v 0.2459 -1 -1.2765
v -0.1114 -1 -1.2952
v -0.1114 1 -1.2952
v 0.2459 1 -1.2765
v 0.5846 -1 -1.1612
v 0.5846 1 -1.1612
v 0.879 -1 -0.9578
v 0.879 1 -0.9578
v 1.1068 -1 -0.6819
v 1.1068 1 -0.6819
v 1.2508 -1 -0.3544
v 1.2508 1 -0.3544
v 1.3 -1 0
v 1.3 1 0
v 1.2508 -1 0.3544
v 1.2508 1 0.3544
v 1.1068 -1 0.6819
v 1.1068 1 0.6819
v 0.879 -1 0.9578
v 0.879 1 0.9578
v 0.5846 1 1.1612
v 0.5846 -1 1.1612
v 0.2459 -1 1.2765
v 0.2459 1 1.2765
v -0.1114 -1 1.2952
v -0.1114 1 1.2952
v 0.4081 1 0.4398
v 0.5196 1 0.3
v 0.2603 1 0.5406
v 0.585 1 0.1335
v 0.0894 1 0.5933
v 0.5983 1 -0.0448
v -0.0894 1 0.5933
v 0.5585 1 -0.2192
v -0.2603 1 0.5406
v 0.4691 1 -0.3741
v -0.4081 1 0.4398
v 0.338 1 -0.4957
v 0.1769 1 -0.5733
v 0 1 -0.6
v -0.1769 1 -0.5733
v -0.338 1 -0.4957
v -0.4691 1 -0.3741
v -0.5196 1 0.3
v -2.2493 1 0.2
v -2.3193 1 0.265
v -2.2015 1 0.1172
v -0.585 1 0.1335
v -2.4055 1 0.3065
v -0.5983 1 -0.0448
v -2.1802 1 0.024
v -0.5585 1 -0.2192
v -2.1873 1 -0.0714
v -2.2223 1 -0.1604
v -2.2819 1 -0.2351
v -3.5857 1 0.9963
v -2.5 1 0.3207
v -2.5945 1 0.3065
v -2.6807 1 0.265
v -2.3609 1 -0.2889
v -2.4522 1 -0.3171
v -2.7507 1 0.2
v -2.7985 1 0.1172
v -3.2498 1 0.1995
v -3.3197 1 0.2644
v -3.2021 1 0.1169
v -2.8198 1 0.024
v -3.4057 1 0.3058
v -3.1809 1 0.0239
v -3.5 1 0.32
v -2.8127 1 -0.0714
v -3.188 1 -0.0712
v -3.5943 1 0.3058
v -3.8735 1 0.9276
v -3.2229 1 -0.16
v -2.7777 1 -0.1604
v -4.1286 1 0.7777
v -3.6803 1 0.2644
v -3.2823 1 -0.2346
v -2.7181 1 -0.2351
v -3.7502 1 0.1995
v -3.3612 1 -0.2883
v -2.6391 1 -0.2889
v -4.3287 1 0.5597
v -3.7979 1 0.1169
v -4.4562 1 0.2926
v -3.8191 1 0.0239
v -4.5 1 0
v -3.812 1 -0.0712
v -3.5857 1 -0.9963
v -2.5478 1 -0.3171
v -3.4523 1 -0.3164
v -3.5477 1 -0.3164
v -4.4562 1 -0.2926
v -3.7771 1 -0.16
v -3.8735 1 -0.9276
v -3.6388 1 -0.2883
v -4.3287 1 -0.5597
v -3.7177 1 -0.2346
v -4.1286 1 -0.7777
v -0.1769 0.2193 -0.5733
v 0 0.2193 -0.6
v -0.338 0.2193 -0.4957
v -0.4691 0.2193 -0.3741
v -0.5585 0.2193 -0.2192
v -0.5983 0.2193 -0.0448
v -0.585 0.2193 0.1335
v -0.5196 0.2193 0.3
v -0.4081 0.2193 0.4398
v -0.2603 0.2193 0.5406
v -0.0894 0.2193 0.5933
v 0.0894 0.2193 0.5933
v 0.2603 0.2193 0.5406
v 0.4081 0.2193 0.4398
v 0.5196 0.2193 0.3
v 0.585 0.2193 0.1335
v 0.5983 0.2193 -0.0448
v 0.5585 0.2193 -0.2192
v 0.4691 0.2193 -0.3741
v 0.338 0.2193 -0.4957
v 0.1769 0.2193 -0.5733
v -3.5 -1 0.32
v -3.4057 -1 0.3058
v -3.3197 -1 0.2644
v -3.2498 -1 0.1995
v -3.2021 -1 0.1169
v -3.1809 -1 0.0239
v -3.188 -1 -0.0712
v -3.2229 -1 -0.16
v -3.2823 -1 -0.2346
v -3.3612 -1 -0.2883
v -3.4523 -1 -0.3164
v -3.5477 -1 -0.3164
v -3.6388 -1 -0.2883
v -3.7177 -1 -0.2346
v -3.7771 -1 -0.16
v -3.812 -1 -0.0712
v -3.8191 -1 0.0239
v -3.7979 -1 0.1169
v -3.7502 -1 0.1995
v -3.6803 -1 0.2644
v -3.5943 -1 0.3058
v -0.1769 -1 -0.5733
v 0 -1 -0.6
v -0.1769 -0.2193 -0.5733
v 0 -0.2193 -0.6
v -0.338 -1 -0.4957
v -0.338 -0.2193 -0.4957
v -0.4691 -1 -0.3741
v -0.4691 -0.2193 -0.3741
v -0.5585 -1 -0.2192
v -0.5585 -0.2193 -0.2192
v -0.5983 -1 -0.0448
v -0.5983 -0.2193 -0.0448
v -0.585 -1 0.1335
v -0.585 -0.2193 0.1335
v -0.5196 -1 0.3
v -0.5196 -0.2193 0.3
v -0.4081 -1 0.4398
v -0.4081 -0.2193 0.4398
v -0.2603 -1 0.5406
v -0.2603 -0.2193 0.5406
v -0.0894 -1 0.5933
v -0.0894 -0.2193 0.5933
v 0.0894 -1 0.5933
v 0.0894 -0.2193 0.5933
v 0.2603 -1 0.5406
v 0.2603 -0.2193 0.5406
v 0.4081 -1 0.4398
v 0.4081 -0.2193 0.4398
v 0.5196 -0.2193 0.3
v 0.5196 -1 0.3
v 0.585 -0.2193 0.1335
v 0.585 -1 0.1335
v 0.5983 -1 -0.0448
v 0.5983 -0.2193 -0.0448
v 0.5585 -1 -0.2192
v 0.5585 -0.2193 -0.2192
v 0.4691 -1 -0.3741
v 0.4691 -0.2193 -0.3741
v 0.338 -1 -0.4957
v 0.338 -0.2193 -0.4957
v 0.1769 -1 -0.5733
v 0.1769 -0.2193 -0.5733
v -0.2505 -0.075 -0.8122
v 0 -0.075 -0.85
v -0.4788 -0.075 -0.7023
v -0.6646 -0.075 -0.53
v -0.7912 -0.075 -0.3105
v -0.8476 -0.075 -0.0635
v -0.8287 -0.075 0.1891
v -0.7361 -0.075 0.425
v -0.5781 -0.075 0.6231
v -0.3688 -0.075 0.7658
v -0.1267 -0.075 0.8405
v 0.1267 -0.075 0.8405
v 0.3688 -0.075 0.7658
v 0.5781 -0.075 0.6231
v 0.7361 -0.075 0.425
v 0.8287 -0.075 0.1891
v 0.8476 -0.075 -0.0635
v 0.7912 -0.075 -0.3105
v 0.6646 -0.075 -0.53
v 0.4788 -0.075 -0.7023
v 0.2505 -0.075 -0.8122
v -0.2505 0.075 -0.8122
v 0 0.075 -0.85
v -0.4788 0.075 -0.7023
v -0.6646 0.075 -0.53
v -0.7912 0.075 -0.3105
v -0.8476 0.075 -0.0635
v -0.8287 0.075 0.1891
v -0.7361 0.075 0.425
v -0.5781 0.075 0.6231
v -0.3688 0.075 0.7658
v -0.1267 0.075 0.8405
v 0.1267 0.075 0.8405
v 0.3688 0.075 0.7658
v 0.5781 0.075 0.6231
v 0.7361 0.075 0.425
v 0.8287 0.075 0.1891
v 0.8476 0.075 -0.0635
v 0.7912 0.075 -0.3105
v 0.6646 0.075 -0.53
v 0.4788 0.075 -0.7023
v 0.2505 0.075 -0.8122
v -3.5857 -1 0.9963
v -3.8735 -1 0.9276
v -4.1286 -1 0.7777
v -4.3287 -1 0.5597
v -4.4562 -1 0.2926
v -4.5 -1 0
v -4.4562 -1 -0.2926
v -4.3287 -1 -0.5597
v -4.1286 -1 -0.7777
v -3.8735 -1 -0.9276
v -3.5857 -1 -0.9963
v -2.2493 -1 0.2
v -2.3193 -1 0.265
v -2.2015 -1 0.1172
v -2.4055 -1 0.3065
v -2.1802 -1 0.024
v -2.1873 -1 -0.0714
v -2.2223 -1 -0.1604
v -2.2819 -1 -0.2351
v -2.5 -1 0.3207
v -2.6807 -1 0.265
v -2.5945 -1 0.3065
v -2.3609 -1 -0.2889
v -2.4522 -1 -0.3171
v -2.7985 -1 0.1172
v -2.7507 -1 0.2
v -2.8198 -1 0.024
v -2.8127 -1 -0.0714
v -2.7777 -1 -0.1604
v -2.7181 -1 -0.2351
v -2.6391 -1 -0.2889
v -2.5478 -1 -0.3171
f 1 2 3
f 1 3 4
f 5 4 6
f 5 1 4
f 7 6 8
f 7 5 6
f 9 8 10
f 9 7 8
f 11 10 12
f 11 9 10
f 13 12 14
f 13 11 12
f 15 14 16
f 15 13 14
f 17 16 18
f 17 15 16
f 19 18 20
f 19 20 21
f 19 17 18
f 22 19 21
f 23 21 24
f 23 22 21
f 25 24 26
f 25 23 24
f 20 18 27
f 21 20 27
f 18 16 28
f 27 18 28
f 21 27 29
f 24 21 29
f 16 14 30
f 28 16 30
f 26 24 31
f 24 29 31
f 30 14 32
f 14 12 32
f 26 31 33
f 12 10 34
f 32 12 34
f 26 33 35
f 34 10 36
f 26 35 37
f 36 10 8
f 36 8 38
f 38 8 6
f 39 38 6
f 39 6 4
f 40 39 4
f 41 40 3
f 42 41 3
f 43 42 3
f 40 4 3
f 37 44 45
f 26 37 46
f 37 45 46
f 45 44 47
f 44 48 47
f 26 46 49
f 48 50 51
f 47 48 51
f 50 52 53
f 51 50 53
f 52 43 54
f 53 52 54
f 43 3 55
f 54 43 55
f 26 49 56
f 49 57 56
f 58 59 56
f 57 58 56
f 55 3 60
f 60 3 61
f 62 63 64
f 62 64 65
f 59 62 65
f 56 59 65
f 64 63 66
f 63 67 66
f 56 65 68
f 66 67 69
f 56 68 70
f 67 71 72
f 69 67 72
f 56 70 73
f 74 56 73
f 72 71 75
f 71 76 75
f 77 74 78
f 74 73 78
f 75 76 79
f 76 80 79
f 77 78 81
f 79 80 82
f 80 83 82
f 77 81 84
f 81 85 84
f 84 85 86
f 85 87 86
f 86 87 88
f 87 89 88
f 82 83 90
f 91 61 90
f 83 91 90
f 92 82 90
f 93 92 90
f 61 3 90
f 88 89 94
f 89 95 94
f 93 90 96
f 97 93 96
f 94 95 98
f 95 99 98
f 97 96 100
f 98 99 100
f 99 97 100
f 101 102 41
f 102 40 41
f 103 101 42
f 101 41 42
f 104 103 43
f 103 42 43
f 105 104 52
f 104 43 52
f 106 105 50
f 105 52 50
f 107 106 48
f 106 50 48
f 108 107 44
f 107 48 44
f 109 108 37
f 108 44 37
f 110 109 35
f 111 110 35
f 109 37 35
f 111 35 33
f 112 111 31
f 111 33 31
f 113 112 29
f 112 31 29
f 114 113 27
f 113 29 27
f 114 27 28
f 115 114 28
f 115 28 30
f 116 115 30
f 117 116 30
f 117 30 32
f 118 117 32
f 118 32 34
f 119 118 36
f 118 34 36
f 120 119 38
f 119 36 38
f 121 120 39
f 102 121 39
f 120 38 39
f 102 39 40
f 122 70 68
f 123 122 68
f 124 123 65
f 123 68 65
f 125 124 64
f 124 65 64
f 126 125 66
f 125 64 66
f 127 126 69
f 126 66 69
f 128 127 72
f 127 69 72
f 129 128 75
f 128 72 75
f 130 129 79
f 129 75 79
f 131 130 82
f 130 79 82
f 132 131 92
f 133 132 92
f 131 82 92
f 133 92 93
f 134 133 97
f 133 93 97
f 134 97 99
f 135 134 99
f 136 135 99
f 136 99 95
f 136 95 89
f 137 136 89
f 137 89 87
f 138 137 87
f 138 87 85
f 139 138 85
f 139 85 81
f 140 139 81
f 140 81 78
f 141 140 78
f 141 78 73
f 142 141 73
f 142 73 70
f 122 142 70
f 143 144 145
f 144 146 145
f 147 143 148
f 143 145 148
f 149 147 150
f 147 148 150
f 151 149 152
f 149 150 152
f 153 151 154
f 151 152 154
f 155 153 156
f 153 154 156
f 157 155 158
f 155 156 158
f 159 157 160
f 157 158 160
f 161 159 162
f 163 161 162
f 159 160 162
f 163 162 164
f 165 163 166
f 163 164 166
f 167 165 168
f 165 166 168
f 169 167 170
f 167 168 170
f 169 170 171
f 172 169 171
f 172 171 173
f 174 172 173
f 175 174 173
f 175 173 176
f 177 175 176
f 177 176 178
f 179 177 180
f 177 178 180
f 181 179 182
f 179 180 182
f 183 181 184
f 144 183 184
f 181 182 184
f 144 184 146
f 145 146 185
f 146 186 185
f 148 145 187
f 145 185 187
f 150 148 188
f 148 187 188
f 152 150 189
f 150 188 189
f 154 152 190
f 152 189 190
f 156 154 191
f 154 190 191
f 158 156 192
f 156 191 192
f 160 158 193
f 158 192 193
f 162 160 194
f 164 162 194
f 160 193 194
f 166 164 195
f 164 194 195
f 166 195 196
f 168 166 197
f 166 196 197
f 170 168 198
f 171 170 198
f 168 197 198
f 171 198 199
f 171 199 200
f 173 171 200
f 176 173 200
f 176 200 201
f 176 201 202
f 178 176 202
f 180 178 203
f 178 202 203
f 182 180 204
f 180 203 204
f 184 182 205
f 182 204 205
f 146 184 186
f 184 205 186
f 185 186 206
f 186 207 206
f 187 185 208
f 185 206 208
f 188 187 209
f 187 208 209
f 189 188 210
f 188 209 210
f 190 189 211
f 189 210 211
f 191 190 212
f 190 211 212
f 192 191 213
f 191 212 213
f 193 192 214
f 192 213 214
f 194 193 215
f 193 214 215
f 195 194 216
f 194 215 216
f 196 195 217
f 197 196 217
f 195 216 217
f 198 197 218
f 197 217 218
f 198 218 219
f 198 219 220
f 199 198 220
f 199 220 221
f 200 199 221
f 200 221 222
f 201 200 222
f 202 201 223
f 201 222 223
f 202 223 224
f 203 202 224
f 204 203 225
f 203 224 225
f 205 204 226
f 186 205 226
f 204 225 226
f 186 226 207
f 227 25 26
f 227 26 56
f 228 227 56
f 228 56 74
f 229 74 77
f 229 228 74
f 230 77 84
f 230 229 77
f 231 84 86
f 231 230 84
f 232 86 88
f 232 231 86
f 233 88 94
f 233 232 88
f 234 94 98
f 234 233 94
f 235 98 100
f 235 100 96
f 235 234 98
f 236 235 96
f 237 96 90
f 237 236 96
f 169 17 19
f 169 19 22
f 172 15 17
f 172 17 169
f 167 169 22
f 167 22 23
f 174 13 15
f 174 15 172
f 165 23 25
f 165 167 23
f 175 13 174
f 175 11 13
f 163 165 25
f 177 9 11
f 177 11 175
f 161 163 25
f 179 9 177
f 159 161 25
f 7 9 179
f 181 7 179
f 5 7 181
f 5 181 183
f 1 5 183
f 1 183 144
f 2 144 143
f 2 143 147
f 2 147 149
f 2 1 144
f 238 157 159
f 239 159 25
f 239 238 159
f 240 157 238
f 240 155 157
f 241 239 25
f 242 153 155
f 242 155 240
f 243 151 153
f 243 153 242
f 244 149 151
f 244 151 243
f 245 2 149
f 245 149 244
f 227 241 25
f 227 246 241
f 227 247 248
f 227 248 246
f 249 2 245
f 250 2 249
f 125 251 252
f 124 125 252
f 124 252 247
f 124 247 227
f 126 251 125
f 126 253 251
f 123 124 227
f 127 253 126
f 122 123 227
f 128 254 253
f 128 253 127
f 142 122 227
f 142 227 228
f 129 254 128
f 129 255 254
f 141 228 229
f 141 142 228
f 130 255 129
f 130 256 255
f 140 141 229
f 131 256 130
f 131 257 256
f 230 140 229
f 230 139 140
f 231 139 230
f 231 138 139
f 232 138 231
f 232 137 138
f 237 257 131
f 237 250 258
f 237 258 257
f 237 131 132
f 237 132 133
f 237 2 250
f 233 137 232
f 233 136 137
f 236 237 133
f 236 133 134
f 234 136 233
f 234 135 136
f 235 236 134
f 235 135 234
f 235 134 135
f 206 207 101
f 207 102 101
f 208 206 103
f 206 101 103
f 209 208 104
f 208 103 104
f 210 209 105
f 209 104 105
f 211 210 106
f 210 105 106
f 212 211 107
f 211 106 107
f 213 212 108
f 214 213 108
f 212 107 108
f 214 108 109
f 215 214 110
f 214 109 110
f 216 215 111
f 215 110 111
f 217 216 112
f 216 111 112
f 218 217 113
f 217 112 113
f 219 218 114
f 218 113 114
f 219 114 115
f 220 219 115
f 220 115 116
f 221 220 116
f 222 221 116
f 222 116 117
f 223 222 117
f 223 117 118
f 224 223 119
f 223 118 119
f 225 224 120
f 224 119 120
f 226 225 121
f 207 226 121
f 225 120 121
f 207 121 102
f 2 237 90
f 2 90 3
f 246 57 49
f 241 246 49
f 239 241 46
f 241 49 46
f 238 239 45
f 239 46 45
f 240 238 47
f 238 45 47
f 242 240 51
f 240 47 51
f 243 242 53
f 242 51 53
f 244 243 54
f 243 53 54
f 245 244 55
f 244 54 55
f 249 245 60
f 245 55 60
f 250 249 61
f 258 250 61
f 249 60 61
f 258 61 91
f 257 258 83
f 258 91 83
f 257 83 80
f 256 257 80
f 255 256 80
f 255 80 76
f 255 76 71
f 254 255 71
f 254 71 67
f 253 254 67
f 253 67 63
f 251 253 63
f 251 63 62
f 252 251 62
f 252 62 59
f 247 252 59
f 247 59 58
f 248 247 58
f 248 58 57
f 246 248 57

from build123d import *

# Parameters (mm, degrees)
BOSS_EXTRUDE1_DEPTH      = 1
BOSS_EXTRUDE1_DEPTH_BACK = 1
CUT_EXTRUDE1_REACH       = 7.093
SKETCH5_R                = 0.3207
SKETCH5_R_2              = 0.32


with BuildPart() as part:
    # Sketch1 → Boss-Extrude1 (new, two sides: drawn at the far end of the back side and taken through both)
    with BuildSketch(Plane(origin=(0, 0, 0), x_dir=(1, 0, 0), z_dir=(0, 1, 0)).offset(-BOSS_EXTRUDE1_DEPTH_BACK)):
        with BuildLine():
            Line((-3.585714286, 0.996319759), (-0.111428571, 1.295215686))
            ThreePointArc((-0.111428571, 1.295215686), (1.3, 0), (-0.111428571, -1.295215686))
            Line((-0.111428571, -1.295215686), (-3.585714286, -0.996319759))
            ThreePointArc((-3.585714286, -0.996319759), (-4.5, 0), (-3.585714286, 0.996319759))
        make_face()
    extrude(amount=BOSS_EXTRUDE1_DEPTH + BOSS_EXTRUDE1_DEPTH_BACK)

    # Sketch4 → Cut-Revolve1 (revolve, cut)
    with BuildSketch(Plane.XY):
        Polygon((0.85, 0), (0.85, 0.075), (0.6, 0.219337567), (0.6, 1), (0, 1), (0, -1), (0.6, -1), (0.6, -0.219337567), (0.85, -0.075), align=None)
    revolve(axis=Axis((0, -1, 0), (0, 1, 0)), mode=Mode.SUBTRACT)

    # Sketch5 → Cut-Extrude1 (cut, up to next)
    with BuildSketch(Plane(origin=(0, 1, 0), x_dir=(1, 0, 0), z_dir=(0, 1, 0)), mode=Mode.PRIVATE) as cut_extrude1_sk1:
        with Locations((-2.5, 0)):
            Circle(SKETCH5_R)
    cut_extrude1_tool1 = extrude(cut_extrude1_sk1.sketch, amount=-CUT_EXTRUDE1_REACH, mode=Mode.PRIVATE) & part.part
    # Sketch5 → Cut-Extrude1 (cut, up to next)
    with BuildSketch(Plane(origin=(0, 1, 0), x_dir=(1, 0, 0), z_dir=(0, 1, 0)), mode=Mode.PRIVATE) as cut_extrude1_sk2:
        with Locations((-3.5, 0)):
            Circle(SKETCH5_R_2)
    cut_extrude1_tool2 = extrude(cut_extrude1_sk2.sketch, amount=-CUT_EXTRUDE1_REACH, mode=Mode.PRIVATE) & part.part
    add(cut_extrude1_tool1.solids().sort_by_distance((-2.5, 1, 0))[0], mode=Mode.SUBTRACT)
    add(cut_extrude1_tool2.solids().sort_by_distance((-3.5, 1, 0))[0], mode=Mode.SUBTRACT)


solid = part.part
